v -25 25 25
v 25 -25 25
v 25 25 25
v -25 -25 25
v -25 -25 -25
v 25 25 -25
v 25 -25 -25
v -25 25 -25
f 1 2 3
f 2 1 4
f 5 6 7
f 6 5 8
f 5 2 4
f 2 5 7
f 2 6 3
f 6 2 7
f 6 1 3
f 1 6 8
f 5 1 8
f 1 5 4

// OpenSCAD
// Archiyou -> OpenSCAD  |  script: boxpubtest  |  units: mm
// OpenSCAD has no units: coordinates are in mm.
// Parts: 1 CSG, 0 baked, 0 2D
// Parameters at export, for reference only (nothing in this file is linked to them):
//   SIZE = 50

$fn = 32;
PART = "";

// Mesh:Box
module Mesh_Box() {
    cube([50, 50, 50], center = true);
}

// 3D parts
if (PART == "" || PART == "Mesh_Box") Mesh_Box();
